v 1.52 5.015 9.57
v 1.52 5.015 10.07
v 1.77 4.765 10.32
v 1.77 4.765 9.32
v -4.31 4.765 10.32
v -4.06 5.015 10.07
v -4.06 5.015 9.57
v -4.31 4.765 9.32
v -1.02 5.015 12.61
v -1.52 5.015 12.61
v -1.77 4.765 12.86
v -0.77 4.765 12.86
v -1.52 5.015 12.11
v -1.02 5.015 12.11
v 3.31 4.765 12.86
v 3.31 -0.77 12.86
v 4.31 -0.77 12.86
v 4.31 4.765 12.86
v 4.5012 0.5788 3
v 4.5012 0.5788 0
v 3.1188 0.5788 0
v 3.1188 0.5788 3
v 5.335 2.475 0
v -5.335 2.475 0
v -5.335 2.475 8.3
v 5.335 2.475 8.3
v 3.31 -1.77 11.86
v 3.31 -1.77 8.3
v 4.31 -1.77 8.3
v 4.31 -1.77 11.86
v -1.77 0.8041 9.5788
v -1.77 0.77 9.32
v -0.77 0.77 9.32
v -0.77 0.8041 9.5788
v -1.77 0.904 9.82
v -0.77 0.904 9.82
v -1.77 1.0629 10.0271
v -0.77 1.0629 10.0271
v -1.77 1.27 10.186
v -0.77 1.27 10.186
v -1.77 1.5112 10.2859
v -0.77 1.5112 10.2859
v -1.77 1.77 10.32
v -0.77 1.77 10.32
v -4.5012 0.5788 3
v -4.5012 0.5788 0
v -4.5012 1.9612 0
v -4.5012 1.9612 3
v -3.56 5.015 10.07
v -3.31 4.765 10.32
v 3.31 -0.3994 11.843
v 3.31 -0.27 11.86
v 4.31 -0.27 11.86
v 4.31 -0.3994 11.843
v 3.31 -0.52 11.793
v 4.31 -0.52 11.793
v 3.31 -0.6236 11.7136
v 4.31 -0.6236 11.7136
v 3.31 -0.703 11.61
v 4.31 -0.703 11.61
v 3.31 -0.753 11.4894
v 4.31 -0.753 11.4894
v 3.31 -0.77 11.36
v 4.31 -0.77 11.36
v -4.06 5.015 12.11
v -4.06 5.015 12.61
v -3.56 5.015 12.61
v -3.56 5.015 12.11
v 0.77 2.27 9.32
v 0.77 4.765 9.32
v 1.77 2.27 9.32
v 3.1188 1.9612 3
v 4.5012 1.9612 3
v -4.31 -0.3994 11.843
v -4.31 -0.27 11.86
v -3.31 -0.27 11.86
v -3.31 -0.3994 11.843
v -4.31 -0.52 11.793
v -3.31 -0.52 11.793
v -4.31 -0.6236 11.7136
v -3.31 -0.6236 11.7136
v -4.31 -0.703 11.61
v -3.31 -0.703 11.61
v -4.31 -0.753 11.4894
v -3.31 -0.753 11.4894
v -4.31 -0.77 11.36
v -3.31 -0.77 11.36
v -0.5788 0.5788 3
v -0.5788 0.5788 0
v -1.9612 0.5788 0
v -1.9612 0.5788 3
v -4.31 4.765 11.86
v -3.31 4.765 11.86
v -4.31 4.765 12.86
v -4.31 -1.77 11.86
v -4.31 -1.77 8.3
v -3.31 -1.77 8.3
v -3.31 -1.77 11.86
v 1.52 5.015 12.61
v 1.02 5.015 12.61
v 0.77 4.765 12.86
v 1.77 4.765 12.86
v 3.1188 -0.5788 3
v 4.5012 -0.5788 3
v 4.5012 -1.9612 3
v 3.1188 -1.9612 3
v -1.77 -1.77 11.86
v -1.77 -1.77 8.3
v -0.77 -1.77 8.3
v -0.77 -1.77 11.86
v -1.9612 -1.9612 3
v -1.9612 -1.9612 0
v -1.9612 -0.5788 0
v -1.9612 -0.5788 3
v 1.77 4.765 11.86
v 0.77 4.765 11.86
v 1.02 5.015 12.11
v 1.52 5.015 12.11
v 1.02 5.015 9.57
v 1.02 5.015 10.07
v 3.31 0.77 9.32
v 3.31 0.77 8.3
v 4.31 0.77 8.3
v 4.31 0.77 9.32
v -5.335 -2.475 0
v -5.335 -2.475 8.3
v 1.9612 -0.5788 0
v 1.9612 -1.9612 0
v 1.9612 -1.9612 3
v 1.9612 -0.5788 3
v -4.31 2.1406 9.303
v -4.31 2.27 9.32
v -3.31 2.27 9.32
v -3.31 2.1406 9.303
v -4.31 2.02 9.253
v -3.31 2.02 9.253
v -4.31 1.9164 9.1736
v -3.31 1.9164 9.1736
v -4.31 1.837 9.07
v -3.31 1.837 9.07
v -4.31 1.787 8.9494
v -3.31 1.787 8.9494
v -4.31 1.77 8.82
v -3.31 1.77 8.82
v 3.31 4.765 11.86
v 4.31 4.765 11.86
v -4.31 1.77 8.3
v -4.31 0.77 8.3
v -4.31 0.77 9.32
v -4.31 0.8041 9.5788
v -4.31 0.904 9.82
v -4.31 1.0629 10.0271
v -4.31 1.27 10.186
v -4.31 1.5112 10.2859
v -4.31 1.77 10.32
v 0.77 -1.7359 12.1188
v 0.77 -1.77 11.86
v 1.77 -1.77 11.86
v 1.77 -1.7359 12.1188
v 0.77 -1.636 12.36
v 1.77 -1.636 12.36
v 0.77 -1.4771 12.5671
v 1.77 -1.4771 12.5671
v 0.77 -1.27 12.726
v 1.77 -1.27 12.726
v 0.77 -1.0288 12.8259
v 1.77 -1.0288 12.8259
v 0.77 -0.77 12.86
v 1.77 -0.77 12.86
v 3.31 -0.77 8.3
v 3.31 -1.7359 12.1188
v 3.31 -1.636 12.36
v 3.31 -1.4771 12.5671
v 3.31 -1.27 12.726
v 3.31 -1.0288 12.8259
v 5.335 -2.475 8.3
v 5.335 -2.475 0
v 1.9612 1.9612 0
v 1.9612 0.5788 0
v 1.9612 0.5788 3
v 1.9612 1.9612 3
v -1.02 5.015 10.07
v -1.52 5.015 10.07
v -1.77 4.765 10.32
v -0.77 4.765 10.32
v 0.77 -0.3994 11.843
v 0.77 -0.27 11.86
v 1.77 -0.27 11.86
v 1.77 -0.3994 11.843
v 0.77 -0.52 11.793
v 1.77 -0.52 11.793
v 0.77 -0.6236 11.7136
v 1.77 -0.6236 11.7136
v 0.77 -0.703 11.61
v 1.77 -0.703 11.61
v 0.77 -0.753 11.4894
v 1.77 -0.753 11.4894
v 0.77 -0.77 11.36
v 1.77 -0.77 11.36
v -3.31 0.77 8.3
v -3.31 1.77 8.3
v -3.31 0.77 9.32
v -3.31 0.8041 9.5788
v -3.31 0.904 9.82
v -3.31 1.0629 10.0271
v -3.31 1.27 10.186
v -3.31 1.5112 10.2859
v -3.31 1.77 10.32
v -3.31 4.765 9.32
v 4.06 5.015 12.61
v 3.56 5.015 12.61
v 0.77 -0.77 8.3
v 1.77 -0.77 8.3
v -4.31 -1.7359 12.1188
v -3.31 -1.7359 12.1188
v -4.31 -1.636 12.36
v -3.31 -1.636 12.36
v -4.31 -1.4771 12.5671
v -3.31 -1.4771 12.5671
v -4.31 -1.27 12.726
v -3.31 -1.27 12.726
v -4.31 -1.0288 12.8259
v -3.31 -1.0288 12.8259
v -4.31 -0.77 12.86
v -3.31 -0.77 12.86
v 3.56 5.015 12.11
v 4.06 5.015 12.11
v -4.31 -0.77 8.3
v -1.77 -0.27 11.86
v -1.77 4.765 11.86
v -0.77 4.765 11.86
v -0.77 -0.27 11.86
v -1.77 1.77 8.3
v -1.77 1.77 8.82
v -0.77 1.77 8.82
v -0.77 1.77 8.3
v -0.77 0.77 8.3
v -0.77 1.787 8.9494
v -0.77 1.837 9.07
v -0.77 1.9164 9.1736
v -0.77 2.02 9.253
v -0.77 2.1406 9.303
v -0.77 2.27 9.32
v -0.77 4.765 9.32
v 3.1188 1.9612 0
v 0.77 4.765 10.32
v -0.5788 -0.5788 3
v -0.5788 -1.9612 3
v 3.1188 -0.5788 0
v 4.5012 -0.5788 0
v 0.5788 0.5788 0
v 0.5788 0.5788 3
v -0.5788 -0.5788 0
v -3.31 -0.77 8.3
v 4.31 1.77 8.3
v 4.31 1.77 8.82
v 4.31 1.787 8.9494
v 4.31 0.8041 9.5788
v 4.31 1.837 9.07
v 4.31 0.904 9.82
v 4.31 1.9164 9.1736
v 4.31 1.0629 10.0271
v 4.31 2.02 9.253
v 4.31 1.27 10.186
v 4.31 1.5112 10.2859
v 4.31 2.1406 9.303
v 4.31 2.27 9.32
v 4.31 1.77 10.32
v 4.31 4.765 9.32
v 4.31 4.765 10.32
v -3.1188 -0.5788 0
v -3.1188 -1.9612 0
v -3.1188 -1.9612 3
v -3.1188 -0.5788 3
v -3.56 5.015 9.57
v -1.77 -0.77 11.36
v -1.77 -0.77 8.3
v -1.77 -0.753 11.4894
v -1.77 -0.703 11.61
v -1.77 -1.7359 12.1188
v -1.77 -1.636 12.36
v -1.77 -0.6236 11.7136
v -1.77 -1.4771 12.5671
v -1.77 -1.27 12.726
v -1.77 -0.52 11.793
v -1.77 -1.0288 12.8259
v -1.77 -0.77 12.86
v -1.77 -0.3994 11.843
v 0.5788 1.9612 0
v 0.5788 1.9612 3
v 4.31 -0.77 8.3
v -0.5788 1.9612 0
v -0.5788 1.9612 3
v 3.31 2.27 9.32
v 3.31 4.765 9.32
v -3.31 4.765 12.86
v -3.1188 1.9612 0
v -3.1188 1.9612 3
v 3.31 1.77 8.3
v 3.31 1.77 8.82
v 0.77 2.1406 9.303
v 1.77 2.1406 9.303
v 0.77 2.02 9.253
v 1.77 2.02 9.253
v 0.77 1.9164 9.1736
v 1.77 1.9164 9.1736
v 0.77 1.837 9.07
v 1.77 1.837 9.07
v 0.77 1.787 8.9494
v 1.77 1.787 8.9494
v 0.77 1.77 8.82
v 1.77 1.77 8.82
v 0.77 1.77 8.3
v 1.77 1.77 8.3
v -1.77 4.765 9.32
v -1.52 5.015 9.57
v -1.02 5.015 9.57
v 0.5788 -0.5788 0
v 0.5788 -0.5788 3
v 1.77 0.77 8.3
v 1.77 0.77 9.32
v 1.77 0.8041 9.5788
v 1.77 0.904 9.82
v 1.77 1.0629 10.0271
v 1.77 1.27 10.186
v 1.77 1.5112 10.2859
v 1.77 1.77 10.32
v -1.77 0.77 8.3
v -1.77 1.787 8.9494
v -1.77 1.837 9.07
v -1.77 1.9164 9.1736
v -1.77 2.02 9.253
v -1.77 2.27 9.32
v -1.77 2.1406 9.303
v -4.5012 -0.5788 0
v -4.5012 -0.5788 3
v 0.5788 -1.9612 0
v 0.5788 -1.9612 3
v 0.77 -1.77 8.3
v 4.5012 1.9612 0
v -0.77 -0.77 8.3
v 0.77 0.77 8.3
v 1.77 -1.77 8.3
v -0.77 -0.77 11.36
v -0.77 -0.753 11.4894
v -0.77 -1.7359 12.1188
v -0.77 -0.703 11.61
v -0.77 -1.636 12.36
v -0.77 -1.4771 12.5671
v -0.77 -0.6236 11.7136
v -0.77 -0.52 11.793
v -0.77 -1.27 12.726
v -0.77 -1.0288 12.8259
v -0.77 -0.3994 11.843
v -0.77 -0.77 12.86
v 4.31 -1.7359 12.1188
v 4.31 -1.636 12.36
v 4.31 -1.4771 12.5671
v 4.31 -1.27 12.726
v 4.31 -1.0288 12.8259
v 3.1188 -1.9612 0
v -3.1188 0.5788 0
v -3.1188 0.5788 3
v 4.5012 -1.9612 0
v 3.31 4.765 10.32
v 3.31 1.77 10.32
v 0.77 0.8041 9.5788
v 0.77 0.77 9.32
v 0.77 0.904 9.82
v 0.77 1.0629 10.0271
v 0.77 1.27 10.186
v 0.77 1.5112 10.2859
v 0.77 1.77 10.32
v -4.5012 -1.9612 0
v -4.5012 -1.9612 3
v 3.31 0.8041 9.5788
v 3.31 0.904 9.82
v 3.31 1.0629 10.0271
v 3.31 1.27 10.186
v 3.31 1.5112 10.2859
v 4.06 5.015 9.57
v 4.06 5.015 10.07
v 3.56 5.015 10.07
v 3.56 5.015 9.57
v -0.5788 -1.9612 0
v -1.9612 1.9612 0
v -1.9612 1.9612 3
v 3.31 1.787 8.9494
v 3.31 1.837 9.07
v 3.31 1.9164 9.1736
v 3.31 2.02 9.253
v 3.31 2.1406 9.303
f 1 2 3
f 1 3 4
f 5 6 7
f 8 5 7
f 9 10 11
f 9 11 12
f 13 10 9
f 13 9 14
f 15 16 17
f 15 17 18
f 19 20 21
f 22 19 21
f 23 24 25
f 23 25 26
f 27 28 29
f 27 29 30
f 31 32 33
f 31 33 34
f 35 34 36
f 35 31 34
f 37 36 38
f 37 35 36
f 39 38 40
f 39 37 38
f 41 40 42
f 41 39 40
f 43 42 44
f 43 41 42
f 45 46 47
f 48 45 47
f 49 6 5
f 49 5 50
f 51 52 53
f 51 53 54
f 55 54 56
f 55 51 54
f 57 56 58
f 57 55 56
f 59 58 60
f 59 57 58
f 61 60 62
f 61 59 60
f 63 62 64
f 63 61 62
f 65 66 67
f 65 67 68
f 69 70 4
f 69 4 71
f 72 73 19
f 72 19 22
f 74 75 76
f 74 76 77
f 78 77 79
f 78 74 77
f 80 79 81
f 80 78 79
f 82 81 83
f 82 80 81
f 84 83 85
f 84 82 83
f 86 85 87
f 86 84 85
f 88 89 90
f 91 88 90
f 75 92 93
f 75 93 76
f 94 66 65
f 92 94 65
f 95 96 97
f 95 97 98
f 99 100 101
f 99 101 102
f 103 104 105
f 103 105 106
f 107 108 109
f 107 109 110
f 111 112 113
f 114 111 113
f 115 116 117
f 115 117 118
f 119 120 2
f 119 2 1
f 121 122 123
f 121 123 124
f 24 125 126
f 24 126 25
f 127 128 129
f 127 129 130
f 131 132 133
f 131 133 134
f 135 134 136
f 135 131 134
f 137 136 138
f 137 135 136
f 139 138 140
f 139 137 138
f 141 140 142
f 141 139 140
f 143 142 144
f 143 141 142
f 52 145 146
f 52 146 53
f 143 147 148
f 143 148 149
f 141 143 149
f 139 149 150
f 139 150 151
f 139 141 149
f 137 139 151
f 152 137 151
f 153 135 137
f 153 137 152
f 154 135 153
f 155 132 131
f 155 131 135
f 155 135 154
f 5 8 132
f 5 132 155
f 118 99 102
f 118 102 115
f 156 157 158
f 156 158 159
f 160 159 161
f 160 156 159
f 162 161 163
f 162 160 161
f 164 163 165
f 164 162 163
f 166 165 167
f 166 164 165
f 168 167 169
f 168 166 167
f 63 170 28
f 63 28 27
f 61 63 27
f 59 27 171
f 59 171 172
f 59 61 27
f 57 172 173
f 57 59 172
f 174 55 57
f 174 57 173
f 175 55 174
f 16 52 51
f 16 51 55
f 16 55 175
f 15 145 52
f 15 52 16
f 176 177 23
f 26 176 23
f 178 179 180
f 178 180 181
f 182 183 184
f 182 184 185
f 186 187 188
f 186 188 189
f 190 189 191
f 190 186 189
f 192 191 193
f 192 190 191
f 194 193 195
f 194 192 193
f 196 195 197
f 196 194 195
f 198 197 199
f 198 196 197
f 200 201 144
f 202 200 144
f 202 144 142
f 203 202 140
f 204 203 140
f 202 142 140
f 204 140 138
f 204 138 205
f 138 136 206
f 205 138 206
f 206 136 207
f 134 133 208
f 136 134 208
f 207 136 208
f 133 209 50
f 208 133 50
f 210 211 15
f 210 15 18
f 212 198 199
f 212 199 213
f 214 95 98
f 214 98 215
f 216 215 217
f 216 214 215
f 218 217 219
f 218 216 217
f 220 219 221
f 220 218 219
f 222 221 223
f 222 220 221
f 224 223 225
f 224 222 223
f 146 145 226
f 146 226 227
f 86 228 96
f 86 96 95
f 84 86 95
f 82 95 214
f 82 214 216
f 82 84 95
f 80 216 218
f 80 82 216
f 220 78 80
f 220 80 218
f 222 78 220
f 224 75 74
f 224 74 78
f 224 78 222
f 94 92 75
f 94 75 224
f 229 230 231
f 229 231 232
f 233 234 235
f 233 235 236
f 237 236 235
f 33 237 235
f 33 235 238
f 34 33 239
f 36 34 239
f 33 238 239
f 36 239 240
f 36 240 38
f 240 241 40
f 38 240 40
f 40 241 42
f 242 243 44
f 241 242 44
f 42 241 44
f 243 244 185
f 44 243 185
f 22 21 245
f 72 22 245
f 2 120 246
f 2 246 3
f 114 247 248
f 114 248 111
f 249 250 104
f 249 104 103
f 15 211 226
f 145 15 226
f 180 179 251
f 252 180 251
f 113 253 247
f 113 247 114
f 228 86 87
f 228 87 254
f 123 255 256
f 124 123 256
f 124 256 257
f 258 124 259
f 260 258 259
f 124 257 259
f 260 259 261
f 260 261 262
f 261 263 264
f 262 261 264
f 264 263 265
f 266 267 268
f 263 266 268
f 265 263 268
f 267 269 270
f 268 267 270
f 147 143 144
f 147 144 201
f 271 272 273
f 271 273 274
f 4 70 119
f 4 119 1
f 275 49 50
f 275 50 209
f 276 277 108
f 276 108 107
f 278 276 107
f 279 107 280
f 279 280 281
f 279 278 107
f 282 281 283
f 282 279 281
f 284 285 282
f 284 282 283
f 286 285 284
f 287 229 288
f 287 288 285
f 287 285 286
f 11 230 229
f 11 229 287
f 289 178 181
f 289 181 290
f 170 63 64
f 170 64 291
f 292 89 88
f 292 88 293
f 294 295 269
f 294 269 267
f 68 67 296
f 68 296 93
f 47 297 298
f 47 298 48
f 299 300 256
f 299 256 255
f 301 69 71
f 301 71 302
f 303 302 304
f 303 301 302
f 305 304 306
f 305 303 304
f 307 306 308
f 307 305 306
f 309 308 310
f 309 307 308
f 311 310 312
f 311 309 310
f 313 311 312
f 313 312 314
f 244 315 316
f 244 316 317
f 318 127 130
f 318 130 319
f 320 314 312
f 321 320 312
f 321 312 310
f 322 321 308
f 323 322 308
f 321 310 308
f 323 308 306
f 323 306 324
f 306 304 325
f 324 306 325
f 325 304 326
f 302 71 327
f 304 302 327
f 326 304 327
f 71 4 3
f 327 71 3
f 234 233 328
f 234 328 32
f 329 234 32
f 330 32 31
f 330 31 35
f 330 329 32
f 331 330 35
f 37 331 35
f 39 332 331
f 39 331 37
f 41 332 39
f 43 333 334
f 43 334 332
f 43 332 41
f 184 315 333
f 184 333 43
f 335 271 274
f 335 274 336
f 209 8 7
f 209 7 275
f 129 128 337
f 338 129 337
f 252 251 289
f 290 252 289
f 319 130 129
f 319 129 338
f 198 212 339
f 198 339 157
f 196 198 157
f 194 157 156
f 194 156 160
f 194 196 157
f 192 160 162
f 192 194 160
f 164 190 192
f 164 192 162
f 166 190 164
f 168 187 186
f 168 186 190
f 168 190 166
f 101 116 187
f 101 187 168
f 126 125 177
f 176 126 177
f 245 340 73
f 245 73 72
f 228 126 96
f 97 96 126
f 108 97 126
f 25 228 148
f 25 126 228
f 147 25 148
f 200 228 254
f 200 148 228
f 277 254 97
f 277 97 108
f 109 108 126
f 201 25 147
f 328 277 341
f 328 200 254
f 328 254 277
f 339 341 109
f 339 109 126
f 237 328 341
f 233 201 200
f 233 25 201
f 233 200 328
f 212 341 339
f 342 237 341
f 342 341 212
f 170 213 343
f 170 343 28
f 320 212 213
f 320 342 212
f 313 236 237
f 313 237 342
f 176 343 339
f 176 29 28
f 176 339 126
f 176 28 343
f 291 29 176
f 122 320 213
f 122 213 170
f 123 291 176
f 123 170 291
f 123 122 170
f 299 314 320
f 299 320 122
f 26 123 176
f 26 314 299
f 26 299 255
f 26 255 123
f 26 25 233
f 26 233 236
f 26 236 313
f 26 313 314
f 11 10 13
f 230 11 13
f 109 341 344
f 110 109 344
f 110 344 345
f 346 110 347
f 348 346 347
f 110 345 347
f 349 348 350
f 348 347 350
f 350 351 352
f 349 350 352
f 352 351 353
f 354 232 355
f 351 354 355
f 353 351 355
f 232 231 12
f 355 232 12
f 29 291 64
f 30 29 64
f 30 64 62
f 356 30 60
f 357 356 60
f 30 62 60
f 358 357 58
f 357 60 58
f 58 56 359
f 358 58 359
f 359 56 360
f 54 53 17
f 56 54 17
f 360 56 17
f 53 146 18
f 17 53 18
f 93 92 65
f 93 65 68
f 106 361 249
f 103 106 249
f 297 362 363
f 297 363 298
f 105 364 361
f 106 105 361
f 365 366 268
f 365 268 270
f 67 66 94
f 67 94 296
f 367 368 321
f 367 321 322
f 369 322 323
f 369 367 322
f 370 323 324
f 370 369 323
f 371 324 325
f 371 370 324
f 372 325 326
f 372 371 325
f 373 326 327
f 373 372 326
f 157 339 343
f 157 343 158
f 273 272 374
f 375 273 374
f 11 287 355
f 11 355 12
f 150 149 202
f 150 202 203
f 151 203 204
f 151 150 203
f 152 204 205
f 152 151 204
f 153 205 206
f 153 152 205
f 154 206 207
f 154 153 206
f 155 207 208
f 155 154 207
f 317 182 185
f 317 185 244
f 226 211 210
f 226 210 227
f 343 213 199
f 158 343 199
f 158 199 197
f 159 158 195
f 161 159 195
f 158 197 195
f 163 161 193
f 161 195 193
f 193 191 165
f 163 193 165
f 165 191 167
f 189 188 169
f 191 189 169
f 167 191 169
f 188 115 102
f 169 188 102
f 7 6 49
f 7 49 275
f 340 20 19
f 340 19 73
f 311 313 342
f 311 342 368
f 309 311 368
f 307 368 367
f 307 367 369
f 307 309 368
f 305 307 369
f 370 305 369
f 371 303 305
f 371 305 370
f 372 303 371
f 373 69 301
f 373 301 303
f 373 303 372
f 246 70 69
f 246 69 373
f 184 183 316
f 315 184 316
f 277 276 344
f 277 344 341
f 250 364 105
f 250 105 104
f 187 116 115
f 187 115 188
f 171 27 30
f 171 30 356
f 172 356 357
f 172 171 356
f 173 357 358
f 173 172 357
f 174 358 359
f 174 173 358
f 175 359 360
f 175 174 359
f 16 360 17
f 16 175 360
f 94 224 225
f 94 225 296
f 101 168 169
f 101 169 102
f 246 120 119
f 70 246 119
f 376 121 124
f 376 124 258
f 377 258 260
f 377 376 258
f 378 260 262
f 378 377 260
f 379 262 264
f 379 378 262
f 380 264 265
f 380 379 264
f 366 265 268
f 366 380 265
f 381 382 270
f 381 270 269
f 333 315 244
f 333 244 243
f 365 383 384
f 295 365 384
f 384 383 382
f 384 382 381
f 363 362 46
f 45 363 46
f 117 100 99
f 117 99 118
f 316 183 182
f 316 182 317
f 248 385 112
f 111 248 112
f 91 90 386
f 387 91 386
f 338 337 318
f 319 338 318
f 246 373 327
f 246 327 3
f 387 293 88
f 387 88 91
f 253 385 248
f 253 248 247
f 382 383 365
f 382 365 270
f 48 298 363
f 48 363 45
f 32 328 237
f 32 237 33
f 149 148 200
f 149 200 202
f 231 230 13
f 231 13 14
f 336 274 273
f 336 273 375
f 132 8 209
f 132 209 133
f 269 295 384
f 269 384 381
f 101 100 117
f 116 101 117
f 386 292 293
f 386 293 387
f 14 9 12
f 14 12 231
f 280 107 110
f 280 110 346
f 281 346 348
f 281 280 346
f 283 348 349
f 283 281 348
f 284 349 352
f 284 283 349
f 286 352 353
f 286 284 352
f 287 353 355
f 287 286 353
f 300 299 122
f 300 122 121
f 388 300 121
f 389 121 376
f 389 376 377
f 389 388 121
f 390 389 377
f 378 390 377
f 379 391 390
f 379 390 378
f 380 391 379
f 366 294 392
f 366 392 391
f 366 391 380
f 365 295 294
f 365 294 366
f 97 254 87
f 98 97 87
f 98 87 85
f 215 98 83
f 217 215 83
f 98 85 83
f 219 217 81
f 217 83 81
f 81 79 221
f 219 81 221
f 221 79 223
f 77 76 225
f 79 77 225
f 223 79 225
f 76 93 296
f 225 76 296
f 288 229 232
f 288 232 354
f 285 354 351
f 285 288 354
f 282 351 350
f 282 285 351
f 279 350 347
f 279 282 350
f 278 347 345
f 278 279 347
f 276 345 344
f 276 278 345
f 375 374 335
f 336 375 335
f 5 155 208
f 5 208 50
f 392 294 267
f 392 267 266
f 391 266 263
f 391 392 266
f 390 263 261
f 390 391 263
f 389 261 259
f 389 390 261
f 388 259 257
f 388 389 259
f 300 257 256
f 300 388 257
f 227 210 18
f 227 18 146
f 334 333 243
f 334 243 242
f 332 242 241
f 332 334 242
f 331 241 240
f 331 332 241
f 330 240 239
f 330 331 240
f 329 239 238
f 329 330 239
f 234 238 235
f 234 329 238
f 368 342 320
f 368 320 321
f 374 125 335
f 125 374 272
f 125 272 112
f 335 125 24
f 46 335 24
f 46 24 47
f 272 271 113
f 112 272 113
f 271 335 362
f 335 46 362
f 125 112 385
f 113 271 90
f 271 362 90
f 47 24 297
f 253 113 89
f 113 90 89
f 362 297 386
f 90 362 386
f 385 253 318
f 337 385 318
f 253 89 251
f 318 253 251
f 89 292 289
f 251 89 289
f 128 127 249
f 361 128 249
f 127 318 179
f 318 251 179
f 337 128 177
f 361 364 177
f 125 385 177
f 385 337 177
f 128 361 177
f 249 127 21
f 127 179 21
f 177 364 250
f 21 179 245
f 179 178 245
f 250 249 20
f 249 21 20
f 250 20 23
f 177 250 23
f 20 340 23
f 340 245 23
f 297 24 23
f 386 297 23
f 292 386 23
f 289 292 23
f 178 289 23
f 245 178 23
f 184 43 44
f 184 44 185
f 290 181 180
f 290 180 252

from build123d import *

# Parameters (mm, degrees)
SKETCH1_W           = 10.67
SKETCH1_H           = 4.95
BOSS_EXTRUDE1_DEPTH = 8.3
SKETCH3_W           = 1.382324252
SKETCH3_H           = 1.382324252
CUT_EXTRUDE1_DEPTH  = 3
BOSS_EXTRUDE2_START = 3.31
BOSS_EXTRUDE2_DEPTH = 1
LPATTERN1_COUNT     = 4
LPATTERN1_PITCH     = 2.54
CHAMFER1_SIZE       = 0.25


with BuildPart() as part:
    # Sketch1 → Boss-Extrude1 (new body)
    with BuildSketch(Plane.XY):
        Rectangle(SKETCH1_W, SKETCH1_H)
    extrude(amount=BOSS_EXTRUDE1_DEPTH)

    # Sketch3 → Cut-Extrude1 (cut)
    with BuildSketch(Plane(origin=(0, 0, 0), x_dir=(-1, 0, 0), z_dir=(0, 0, -1))):
        with Locations((-1.27, 1.27)):
            Rectangle(SKETCH3_W, SKETCH3_H)
        with Locations((-3.81, 1.27)):
            Rectangle(SKETCH3_W, SKETCH3_H)
        with Locations((1.27, 1.27)):
            Rectangle(SKETCH3_W, SKETCH3_H)
        with Locations((3.81, 1.27)):
            Rectangle(SKETCH3_W, SKETCH3_H)
        with Locations((-1.27, -1.27)):
            Rectangle(SKETCH3_W, SKETCH3_H)
        with Locations((1.27, -1.27)):
            Rectangle(SKETCH3_W, SKETCH3_H)
        with Locations((3.81, -1.27)):
            Rectangle(SKETCH3_W, SKETCH3_H)
        with Locations((-3.81, -1.27)):
            Rectangle(SKETCH3_W, SKETCH3_H)
    extrude(amount=-CUT_EXTRUDE1_DEPTH, mode=Mode.SUBTRACT)

    # Sketch4 → Boss-Extrude2 (add)
    with BuildSketch(Plane(origin=(0, 0, 0), x_dir=(0, 0, -1), z_dir=(1, 0, 0)).offset(BOSS_EXTRUDE2_START)):
        with BuildLine():
            Line((-8.3, 0.77), (-9.32, 0.77))
            ThreePointArc((-9.32, 0.77), (-10.027106781, 1.062893219), (-10.32, 1.77))
            Line((-10.32, 1.77), (-10.32, 5.015))
            Line((-10.32, 5.015), (-9.32, 5.015))
            Line((-9.32, 5.015), (-9.32, 2.27))
            ThreePointArc((-9.32, 2.27), (-9.173553391, 1.916446609), (-8.82, 1.77))
            Line((-8.82, 1.77), (-8.3, 1.77))
            Line((-8.3, 1.77), (-8.3, 0.77))
        make_face()
        with BuildLine():
            Line((-8.3, -1.77), (-11.86, -1.77))
            ThreePointArc((-11.86, -1.77), (-12.567106781, -1.477106781), (-12.86, -0.77))
            Line((-12.86, -0.77), (-12.86, 5.015))
            Line((-12.86, 5.015), (-11.86, 5.015))
            Line((-11.86, 5.015), (-11.86, -0.27))
            ThreePointArc((-11.86, -0.27), (-11.713553391, -0.623553391), (-11.36, -0.77))
            Line((-11.36, -0.77), (-8.3, -0.77))
            Line((-8.3, -0.77), (-8.3, -1.77))
        make_face()
    boss_extrude2 = extrude(amount=BOSS_EXTRUDE2_DEPTH)

    # LPattern1: Boss-Extrude2 ×4
    with Locations(*[(-i * LPATTERN1_PITCH, 0, 0) for i in range(1, LPATTERN1_COUNT)]):
        add(boss_extrude2)

    # Chamfer1
    chamfer1_edges = [part.edges().sort_by_distance(p)[0] for p in [
        (3.31, 5.015, 9.82),
        (3.81, 5.015, 9.32),
        (3.81, 5.015, 10.32),
        (4.31, 5.015, 9.82),
        (3.31, 5.015, 12.36),
        (3.81, 5.015, 11.86),
        (3.81, 5.015, 12.86),
        (4.31, 5.015, 12.36),
        (0.77, 5.015, 9.82),
        (1.27, 5.015, 9.32),
        (1.27, 5.015, 10.32),
        (1.77, 5.015, 9.82),
        (0.77, 5.015, 12.36),
        (1.27, 5.015, 11.86),
        (1.27, 5.015, 12.86),
        (1.77, 5.015, 12.36),
        (-1.77, 5.015, 9.82),
        (-1.27, 5.015, 9.32),
        (-1.27, 5.015, 10.32),
        (-0.77, 5.015, 9.82),
        (-1.77, 5.015, 12.36),
        (-1.27, 5.015, 11.86),
        (-1.27, 5.015, 12.86),
        (-0.77, 5.015, 12.36),
        (-4.31, 5.015, 9.82),
        (-3.81, 5.015, 9.32),
        (-3.81, 5.015, 10.32),
        (-3.31, 5.015, 9.82),
        (-4.31, 5.015, 12.36),
        (-3.81, 5.015, 11.86),
        (-3.81, 5.015, 12.86),
        (-3.31, 5.015, 12.36),
    ]]
    chamfer(chamfer1_edges, length=CHAMFER1_SIZE)


solid = part.part
